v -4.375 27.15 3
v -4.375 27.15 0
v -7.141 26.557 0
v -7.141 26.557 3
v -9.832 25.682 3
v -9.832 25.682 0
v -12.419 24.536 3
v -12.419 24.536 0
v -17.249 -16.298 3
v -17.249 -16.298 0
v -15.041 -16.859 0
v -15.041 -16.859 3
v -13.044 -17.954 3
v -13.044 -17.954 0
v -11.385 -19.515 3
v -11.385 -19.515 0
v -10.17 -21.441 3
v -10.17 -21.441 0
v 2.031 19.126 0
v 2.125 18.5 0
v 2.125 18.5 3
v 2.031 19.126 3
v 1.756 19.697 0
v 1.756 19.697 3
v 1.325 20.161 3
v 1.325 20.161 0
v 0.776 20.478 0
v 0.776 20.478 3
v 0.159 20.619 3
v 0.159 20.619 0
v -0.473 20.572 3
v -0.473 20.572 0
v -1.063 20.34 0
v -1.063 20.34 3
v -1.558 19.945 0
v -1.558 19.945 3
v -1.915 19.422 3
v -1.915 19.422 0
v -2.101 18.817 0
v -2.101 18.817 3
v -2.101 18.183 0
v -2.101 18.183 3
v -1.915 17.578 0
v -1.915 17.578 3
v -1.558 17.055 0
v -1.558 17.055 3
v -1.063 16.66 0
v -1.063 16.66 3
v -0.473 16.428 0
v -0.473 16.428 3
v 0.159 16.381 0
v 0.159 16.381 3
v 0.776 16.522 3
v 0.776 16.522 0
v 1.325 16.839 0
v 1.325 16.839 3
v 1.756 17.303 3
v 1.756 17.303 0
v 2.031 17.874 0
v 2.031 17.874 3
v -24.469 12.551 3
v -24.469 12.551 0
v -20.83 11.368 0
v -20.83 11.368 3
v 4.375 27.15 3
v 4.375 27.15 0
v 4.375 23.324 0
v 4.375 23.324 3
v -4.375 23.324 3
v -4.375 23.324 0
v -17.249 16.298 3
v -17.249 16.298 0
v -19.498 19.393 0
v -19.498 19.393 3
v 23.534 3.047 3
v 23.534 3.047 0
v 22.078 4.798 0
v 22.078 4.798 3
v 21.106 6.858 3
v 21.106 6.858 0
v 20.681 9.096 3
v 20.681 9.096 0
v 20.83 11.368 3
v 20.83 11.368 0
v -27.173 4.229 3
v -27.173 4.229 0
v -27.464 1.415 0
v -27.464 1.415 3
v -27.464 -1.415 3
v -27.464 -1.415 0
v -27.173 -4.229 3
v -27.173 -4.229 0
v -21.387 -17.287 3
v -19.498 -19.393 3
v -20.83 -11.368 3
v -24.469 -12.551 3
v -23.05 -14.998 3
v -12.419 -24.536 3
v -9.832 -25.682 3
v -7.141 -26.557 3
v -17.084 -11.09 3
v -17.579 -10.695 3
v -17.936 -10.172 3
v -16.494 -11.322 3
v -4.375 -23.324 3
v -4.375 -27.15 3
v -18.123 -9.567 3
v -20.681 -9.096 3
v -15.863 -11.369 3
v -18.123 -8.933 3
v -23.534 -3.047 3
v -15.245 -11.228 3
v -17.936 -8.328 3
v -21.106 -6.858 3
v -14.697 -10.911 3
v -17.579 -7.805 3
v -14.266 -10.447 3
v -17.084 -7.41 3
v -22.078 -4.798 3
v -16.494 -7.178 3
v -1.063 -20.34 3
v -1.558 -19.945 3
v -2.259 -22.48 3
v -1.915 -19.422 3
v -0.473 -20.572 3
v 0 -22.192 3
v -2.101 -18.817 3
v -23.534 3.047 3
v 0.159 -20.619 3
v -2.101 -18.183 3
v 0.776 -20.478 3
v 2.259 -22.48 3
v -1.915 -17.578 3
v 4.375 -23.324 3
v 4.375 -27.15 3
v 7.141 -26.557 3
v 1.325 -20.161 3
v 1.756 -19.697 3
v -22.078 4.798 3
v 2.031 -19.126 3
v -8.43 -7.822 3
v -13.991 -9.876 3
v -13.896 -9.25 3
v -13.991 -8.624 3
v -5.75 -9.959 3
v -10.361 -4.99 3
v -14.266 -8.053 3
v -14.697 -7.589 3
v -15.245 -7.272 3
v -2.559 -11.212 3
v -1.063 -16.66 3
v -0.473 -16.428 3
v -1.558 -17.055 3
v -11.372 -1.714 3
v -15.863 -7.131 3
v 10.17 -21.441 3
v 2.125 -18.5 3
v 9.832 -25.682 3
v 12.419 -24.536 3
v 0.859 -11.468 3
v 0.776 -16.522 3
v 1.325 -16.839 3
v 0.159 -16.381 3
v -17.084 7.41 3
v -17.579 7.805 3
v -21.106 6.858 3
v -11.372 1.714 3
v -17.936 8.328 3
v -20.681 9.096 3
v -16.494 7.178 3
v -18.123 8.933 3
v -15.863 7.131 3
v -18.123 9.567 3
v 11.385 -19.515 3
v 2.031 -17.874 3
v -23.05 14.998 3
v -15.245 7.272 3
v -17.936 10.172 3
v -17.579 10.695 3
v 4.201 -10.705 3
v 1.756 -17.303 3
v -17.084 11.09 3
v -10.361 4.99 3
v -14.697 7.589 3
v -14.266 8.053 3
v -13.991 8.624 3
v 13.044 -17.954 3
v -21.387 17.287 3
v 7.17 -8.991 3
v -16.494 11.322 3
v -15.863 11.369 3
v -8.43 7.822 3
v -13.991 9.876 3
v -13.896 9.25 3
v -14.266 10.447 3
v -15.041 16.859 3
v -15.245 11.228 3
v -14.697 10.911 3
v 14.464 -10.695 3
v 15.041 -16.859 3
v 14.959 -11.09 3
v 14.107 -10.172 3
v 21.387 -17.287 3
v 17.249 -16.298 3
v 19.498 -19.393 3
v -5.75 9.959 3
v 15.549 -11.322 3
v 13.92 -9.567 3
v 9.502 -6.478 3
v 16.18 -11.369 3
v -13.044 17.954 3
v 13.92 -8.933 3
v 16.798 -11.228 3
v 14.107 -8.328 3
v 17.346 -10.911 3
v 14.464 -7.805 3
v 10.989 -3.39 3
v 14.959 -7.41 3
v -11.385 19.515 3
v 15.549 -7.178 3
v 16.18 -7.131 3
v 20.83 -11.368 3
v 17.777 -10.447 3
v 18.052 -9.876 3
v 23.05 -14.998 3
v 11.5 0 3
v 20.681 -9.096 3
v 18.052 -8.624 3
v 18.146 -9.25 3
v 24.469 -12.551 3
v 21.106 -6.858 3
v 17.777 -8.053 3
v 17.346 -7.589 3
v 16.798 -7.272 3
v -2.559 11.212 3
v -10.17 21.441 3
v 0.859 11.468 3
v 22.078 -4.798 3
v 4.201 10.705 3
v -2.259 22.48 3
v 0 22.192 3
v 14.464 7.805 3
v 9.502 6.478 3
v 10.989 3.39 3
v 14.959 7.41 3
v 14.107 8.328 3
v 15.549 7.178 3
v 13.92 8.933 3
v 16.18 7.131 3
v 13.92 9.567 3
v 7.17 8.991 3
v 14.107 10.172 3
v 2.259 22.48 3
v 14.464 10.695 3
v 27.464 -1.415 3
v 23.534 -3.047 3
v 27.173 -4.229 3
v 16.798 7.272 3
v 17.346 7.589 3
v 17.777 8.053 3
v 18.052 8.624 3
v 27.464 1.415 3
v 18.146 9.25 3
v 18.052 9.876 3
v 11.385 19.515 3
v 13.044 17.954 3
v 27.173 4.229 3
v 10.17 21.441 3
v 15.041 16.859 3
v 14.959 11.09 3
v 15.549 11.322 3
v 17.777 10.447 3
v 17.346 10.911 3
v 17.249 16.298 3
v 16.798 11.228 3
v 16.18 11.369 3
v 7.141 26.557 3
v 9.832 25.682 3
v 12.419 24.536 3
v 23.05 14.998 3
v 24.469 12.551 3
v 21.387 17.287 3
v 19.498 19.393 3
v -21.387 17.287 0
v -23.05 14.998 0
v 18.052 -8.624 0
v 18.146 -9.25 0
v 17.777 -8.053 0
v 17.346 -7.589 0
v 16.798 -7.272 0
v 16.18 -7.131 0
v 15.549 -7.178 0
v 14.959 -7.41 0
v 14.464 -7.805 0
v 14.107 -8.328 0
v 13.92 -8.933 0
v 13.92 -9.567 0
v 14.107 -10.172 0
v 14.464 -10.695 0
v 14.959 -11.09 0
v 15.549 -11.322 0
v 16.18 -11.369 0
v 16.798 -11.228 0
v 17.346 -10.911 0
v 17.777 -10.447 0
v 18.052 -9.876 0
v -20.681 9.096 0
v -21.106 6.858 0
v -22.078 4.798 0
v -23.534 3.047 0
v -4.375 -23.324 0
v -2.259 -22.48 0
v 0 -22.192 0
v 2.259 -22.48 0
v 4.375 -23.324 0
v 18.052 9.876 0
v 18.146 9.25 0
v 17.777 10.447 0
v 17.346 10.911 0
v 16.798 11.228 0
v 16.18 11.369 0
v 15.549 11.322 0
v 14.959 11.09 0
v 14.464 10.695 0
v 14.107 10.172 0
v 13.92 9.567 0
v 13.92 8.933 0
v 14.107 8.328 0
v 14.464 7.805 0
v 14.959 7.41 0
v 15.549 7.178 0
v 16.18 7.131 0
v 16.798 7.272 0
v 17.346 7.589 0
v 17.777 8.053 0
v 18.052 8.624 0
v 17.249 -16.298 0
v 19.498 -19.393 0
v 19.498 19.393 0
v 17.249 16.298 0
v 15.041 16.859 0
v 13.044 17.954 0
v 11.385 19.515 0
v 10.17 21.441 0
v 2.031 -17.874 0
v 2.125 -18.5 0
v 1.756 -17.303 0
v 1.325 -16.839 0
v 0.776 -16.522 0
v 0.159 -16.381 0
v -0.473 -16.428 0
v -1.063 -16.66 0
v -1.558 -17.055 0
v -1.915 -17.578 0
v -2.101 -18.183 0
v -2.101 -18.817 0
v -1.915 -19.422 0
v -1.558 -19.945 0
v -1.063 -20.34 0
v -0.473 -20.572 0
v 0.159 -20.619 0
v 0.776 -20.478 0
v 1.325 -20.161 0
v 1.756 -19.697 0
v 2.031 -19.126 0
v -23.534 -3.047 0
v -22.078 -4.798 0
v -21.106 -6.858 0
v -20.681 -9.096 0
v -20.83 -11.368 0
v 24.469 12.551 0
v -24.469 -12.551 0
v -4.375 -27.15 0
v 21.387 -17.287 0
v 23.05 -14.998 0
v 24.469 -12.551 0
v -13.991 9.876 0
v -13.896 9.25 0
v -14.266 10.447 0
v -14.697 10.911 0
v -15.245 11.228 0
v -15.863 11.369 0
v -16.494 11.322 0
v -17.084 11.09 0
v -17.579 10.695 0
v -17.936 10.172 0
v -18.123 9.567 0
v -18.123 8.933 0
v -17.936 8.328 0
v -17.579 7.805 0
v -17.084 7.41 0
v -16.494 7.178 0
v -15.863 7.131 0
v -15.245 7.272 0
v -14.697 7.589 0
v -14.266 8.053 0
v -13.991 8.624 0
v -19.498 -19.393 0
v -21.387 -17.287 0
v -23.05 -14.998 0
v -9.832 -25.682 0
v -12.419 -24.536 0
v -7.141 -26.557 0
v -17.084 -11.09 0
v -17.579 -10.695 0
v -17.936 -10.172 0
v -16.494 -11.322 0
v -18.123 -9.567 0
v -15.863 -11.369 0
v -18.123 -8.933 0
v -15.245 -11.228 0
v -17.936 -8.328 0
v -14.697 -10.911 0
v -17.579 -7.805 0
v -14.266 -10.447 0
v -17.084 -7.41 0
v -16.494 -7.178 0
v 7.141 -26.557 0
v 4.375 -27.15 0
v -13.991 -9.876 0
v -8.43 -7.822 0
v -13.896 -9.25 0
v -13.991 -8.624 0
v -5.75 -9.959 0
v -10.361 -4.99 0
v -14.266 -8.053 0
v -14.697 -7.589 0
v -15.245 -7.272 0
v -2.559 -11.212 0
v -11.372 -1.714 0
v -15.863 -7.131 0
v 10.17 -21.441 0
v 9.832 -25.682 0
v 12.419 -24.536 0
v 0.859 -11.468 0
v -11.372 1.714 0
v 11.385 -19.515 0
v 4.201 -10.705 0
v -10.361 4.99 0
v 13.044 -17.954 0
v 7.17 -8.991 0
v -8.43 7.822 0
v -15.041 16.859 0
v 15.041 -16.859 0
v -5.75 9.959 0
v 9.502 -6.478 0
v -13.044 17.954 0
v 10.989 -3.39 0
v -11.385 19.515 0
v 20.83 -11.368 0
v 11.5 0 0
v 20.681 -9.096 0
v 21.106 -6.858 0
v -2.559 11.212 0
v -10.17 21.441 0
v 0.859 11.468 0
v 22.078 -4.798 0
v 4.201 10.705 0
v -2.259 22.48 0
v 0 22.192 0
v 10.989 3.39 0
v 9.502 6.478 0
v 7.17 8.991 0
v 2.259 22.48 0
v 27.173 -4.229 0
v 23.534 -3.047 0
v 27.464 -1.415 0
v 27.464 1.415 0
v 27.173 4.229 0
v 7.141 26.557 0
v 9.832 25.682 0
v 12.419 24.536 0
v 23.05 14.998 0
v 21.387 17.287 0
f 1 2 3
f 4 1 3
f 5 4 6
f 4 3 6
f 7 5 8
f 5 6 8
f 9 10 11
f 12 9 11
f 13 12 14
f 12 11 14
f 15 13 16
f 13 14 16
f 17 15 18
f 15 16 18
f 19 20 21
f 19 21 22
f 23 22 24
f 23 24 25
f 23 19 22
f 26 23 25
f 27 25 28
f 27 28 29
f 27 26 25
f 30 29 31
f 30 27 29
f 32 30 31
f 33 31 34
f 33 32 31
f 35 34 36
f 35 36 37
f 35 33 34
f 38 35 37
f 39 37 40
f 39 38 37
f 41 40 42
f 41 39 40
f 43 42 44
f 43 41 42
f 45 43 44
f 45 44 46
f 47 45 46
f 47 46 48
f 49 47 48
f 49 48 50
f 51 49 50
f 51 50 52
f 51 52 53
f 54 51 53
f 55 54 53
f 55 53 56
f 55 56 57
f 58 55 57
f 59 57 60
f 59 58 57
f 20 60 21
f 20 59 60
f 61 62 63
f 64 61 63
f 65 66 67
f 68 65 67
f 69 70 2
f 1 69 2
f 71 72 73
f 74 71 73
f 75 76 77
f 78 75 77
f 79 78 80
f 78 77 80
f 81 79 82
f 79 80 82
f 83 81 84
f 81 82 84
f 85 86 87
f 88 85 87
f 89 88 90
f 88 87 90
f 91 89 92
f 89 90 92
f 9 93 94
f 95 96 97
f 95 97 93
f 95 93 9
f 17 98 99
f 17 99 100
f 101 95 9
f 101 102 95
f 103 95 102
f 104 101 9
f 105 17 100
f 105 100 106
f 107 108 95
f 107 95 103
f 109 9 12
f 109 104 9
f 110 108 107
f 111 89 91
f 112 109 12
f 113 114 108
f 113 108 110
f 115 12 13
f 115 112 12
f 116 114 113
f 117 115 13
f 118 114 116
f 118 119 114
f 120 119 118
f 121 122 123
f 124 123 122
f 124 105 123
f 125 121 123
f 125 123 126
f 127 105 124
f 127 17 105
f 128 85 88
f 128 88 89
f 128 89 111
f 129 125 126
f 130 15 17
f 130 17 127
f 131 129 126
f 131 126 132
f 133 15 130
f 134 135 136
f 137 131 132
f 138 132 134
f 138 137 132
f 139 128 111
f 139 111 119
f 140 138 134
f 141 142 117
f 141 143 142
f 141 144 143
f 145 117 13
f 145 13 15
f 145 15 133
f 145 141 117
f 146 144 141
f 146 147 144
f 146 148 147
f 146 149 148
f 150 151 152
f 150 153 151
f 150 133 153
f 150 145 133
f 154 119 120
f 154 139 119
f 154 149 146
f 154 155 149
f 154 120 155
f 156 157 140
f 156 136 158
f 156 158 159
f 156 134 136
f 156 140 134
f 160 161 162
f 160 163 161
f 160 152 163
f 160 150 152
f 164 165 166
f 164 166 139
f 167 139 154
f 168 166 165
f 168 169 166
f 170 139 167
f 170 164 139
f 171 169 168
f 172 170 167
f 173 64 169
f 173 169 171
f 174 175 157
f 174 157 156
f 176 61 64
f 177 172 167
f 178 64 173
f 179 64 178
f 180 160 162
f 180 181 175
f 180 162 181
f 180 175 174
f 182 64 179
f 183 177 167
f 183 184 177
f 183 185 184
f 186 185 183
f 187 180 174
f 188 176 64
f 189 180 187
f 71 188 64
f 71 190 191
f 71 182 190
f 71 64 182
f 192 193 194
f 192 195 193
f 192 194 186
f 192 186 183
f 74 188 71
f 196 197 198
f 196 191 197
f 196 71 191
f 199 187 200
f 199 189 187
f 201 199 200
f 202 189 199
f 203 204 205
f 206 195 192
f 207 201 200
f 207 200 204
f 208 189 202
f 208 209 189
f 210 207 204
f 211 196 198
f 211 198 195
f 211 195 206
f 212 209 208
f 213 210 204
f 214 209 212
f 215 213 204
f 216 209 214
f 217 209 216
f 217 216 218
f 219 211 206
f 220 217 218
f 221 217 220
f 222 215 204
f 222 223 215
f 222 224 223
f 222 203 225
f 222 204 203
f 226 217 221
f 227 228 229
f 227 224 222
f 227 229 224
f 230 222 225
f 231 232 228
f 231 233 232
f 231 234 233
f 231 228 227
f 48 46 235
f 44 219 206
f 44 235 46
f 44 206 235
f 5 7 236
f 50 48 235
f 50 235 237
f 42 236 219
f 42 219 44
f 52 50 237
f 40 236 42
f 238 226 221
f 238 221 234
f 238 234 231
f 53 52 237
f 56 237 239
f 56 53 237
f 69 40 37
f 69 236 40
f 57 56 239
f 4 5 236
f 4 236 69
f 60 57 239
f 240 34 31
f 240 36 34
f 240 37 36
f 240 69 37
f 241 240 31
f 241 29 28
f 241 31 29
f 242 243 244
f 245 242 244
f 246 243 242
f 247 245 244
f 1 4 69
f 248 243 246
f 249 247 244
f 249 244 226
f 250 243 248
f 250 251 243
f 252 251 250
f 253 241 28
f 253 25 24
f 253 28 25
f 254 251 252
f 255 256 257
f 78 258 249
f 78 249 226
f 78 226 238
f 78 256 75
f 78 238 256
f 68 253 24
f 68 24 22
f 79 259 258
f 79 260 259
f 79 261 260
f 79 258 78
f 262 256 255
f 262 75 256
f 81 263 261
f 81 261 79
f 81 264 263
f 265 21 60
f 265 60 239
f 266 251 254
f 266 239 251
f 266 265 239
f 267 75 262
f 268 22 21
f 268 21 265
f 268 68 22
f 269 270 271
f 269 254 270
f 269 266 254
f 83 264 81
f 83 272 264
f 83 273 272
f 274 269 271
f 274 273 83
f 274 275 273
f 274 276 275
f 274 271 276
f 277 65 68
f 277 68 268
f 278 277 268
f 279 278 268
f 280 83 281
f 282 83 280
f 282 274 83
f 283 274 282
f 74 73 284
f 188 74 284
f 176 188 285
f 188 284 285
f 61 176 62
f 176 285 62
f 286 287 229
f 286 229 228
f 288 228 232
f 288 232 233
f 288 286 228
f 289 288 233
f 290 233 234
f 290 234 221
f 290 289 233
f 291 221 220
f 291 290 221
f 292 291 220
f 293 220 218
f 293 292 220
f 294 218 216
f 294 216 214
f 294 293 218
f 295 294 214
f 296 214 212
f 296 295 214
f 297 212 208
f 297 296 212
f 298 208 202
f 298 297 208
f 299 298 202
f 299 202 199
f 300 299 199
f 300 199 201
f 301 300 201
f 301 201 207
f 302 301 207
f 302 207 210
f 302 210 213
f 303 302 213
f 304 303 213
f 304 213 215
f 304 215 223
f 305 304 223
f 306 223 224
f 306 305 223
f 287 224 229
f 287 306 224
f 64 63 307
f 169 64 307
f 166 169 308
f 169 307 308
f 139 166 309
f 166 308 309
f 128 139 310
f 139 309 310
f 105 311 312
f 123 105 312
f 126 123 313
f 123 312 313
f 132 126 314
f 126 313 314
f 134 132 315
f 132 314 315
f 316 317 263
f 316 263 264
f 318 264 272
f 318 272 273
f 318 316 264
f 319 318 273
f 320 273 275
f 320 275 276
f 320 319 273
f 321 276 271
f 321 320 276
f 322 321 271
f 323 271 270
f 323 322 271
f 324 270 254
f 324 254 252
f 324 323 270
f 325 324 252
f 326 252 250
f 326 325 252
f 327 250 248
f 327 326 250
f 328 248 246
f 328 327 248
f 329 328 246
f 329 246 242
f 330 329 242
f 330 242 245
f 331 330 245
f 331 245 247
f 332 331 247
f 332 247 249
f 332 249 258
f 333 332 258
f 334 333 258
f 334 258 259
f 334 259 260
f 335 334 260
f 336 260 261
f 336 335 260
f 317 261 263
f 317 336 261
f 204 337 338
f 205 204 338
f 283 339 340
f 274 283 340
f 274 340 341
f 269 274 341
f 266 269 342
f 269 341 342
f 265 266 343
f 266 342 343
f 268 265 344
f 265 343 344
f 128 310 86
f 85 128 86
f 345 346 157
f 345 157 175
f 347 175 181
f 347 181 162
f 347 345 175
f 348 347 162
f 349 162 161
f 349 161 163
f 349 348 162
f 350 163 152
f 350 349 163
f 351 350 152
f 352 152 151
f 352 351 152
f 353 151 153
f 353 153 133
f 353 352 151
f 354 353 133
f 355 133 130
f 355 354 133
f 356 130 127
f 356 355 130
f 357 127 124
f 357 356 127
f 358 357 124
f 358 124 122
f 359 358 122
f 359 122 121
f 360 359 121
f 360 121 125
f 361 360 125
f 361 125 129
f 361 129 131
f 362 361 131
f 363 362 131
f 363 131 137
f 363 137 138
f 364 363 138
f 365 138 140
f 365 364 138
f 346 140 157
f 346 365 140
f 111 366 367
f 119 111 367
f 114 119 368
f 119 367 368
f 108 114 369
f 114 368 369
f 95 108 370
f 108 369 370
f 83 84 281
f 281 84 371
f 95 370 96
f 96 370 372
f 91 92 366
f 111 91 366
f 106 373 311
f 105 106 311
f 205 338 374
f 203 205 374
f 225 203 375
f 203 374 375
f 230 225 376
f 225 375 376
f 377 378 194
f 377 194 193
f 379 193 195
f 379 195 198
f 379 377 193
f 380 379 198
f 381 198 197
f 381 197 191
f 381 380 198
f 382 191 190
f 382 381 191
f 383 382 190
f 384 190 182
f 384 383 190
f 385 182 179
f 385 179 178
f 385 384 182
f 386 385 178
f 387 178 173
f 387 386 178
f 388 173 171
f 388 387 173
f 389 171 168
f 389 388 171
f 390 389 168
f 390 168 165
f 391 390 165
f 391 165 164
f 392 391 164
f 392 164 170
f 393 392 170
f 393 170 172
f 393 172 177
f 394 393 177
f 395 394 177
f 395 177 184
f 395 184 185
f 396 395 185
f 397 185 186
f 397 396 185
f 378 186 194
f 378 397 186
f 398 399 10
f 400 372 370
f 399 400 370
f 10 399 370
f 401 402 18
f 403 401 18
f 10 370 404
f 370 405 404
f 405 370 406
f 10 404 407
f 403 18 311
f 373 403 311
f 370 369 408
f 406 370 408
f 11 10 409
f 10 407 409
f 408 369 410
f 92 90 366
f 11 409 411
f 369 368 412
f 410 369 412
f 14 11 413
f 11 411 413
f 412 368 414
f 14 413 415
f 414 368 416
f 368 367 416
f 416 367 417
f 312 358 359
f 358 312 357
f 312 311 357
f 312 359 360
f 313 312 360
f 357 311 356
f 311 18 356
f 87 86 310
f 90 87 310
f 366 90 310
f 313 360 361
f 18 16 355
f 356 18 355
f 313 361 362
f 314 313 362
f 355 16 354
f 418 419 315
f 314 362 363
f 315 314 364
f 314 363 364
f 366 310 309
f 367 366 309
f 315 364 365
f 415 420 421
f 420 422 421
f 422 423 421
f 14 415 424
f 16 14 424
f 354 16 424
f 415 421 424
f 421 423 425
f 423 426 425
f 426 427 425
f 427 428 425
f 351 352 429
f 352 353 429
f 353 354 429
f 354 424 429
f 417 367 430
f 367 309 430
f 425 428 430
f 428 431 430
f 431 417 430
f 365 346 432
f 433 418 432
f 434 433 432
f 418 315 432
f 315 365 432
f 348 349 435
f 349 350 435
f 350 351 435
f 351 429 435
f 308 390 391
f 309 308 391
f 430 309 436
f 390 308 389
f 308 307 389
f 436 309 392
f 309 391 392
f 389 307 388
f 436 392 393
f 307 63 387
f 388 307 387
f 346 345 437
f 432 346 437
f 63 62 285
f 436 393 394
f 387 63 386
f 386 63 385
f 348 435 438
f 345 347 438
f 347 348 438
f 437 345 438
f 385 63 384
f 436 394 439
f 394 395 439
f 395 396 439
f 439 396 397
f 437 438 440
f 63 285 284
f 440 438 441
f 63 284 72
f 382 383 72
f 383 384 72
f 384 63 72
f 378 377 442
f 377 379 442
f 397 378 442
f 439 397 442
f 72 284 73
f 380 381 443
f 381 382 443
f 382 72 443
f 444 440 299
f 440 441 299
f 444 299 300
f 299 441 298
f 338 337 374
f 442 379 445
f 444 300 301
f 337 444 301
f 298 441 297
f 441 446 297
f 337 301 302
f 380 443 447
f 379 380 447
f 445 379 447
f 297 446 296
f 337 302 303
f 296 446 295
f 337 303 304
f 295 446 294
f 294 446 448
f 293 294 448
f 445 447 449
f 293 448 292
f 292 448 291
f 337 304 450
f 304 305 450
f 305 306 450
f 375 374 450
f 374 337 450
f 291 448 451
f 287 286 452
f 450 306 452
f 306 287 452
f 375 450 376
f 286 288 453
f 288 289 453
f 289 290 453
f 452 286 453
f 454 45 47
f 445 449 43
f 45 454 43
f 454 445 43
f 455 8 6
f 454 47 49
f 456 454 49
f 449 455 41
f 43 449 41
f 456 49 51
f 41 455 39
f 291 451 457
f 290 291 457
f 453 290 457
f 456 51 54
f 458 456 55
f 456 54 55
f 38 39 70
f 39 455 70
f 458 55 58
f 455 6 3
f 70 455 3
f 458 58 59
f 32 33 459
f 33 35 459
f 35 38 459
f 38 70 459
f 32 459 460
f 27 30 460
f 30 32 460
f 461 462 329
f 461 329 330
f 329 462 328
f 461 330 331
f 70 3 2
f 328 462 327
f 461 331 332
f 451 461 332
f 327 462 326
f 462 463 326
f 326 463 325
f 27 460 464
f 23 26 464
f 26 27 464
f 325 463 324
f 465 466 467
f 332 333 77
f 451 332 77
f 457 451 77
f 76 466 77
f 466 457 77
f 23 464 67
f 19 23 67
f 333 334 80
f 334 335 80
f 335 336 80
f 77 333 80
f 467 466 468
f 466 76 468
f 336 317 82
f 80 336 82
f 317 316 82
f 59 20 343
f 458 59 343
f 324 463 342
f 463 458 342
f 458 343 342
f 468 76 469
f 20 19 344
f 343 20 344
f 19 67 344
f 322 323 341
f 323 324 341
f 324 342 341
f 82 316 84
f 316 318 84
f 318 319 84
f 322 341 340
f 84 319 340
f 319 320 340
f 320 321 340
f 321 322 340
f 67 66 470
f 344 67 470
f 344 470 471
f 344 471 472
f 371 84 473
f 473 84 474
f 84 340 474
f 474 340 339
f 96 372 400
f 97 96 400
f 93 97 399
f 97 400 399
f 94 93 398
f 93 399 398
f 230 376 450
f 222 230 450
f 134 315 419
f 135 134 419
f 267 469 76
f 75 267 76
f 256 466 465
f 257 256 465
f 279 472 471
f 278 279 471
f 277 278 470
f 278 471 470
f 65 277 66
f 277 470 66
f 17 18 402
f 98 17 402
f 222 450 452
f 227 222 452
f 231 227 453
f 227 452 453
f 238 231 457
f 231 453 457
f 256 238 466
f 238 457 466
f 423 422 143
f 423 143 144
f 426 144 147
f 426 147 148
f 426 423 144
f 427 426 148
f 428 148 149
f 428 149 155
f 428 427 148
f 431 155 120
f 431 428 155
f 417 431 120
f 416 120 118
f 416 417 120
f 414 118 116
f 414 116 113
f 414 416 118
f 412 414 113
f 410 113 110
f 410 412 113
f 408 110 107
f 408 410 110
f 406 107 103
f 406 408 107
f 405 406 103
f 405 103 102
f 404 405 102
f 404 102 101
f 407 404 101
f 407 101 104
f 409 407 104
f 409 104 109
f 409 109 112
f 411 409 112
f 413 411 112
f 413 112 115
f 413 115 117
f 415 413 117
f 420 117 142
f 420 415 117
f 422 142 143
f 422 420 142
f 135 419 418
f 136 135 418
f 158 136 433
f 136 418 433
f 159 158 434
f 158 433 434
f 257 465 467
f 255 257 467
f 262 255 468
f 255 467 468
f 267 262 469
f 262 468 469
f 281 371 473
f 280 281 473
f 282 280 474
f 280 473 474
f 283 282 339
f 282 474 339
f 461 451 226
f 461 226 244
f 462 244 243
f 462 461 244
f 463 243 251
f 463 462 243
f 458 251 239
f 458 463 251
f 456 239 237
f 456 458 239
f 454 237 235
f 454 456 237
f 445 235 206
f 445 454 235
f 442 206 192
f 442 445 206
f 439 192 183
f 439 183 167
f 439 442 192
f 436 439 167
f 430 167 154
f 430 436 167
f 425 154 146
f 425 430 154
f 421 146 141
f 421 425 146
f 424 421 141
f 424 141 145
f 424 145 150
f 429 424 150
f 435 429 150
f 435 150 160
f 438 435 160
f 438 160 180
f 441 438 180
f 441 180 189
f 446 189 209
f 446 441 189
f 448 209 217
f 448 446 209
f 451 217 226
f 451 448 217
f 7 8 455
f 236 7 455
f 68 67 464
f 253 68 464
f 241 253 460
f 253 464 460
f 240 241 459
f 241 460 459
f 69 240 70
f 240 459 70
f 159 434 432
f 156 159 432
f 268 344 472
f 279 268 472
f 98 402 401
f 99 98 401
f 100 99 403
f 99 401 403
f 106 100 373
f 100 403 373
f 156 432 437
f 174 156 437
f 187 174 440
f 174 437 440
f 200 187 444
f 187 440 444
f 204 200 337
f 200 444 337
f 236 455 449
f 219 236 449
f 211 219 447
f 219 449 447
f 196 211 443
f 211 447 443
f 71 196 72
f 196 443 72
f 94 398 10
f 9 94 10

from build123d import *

# Parameters (mm, degrees)
SKETCH2_R           = 2.125
SKETCH2_R_2         = 11.5
BOSS_EXTRUDE2_DEPTH = 3


with BuildPart() as part:
    # Sketch2 → Boss-Extrude2 (new body)
    with BuildSketch(Plane.XY):
        with BuildLine():
            Line((-4.375, 23.324003444), (-4.375, 27.149758286))
            ThreePointArc((-4.375, 27.149758286), (-8.497967345, 26.154054198), (-12.418778174, 24.536176326))
            Line((-12.418778174, 24.536176326), (-10.170055898, 21.441075642))
            ThreePointArc((-10.170055898, 21.441075642), (-13.044413657, 17.954095121), (-17.248954599, 16.297954684))
            Line((-17.248954599, 16.297954684), (-19.497676874, 19.393055368))
            ThreePointArc((-19.497676874, 19.393055368), (-22.247967345, 16.164094438), (-24.469005184, 12.550608962))
            Line((-24.469005184, 12.550608962), (-20.830496111, 11.3683857))
            ThreePointArc((-20.830496111, 11.3683857), (-21.106304661, 6.857854099), (-23.534394812, 3.046641182))
            Line((-23.534394812, 3.046641182), (-27.172903884, 4.228864445))
            ThreePointArc((-27.172903884, 4.228864445), (-27.5, 0), (-27.172903884, -4.228864445))
            Line((-27.172903884, -4.228864445), (-23.534394812, -3.046641182))
            ThreePointArc((-23.534394812, -3.046641182), (-21.106304661, -6.857854099), (-20.830496111, -11.3683857))
            Line((-20.830496111, -11.3683857), (-24.469005184, -12.550608962))
            ThreePointArc((-24.469005184, -12.550608962), (-22.247967345, -16.164094438), (-19.497676874, -19.393055368))
            Line((-19.497676874, -19.393055368), (-17.248954599, -16.297954684))
            ThreePointArc((-17.248954599, -16.297954684), (-13.044413657, -17.954095121), (-10.170055898, -21.441075642))
            Line((-10.170055898, -21.441075642), (-12.418778174, -24.536176326))
            ThreePointArc((-12.418778174, -24.536176326), (-8.497967345, -26.154054198), (-4.375, -27.149758286))
            Line((-4.375, -27.149758286), (-4.375, -23.324003444))
            ThreePointArc((-4.375, -23.324003444), (0, -22.192482044), (4.375, -23.324003444))
            Line((4.375, -23.324003444), (4.375, -27.149758286))
            ThreePointArc((4.375, -27.149758286), (8.497967345, -26.154054198), (12.418778174, -24.536176326))
            Line((12.418778174, -24.536176326), (10.170055898, -21.441075642))
            ThreePointArc((10.170055898, -21.441075642), (13.044413657, -17.954095121), (17.248954599, -16.297954684))
            Line((17.248954599, -16.297954684), (19.497676874, -19.393055368))
            ThreePointArc((19.497676874, -19.393055368), (22.247967345, -16.164094438), (24.469005184, -12.550608962))
            Line((24.469005184, -12.550608962), (20.830496111, -11.3683857))
            ThreePointArc((20.830496111, -11.3683857), (21.106304661, -6.857854099), (23.534394812, -3.046641182))
            Line((23.534394812, -3.046641182), (27.172903884, -4.228864445))
            ThreePointArc((27.172903884, -4.228864445), (27.5, 0), (27.172903884, 4.228864445))
            Line((27.172903884, 4.228864445), (23.534394812, 3.046641182))
            ThreePointArc((23.534394812, 3.046641182), (21.106304661, 6.857854099), (20.830496111, 11.3683857))
            Line((20.830496111, 11.3683857), (24.469005184, 12.550608962))
            ThreePointArc((24.469005184, 12.550608962), (22.247967345, 16.164094438), (19.497676874, 19.393055368))
            Line((19.497676874, 19.393055368), (17.248954599, 16.297954684))
            ThreePointArc((17.248954599, 16.297954684), (13.044413657, 17.954095121), (10.170055898, 21.441075642))
            Line((10.170055898, 21.441075642), (12.418778174, 24.536176326))
            ThreePointArc((12.418778174, 24.536176326), (8.497967345, 26.154054198), (4.375, 27.149758286))
            Line((4.375, 27.149758286), (4.375, 23.324003444))
            ThreePointArc((4.375, 23.324003444), (0, 22.192482044), (-4.375, 23.324003444))
        make_face()
        with Locations((16.02146997, 9.25)):
            Circle(SKETCH2_R, mode=Mode.SUBTRACT)
        with Locations((0, 18.5)):
            Circle(SKETCH2_R, mode=Mode.SUBTRACT)
        with Locations((-16.02146997, 9.25)):
            Circle(SKETCH2_R, mode=Mode.SUBTRACT)
        with Locations((-16.02146997, -9.25)):
            Circle(SKETCH2_R, mode=Mode.SUBTRACT)
        with Locations((0, -18.5)):
            Circle(SKETCH2_R, mode=Mode.SUBTRACT)
        with Locations((16.02146997, -9.25)):
            Circle(SKETCH2_R, mode=Mode.SUBTRACT)
        Circle(SKETCH2_R_2, mode=Mode.SUBTRACT)
    extrude(amount=BOSS_EXTRUDE2_DEPTH)


solid = part.part
